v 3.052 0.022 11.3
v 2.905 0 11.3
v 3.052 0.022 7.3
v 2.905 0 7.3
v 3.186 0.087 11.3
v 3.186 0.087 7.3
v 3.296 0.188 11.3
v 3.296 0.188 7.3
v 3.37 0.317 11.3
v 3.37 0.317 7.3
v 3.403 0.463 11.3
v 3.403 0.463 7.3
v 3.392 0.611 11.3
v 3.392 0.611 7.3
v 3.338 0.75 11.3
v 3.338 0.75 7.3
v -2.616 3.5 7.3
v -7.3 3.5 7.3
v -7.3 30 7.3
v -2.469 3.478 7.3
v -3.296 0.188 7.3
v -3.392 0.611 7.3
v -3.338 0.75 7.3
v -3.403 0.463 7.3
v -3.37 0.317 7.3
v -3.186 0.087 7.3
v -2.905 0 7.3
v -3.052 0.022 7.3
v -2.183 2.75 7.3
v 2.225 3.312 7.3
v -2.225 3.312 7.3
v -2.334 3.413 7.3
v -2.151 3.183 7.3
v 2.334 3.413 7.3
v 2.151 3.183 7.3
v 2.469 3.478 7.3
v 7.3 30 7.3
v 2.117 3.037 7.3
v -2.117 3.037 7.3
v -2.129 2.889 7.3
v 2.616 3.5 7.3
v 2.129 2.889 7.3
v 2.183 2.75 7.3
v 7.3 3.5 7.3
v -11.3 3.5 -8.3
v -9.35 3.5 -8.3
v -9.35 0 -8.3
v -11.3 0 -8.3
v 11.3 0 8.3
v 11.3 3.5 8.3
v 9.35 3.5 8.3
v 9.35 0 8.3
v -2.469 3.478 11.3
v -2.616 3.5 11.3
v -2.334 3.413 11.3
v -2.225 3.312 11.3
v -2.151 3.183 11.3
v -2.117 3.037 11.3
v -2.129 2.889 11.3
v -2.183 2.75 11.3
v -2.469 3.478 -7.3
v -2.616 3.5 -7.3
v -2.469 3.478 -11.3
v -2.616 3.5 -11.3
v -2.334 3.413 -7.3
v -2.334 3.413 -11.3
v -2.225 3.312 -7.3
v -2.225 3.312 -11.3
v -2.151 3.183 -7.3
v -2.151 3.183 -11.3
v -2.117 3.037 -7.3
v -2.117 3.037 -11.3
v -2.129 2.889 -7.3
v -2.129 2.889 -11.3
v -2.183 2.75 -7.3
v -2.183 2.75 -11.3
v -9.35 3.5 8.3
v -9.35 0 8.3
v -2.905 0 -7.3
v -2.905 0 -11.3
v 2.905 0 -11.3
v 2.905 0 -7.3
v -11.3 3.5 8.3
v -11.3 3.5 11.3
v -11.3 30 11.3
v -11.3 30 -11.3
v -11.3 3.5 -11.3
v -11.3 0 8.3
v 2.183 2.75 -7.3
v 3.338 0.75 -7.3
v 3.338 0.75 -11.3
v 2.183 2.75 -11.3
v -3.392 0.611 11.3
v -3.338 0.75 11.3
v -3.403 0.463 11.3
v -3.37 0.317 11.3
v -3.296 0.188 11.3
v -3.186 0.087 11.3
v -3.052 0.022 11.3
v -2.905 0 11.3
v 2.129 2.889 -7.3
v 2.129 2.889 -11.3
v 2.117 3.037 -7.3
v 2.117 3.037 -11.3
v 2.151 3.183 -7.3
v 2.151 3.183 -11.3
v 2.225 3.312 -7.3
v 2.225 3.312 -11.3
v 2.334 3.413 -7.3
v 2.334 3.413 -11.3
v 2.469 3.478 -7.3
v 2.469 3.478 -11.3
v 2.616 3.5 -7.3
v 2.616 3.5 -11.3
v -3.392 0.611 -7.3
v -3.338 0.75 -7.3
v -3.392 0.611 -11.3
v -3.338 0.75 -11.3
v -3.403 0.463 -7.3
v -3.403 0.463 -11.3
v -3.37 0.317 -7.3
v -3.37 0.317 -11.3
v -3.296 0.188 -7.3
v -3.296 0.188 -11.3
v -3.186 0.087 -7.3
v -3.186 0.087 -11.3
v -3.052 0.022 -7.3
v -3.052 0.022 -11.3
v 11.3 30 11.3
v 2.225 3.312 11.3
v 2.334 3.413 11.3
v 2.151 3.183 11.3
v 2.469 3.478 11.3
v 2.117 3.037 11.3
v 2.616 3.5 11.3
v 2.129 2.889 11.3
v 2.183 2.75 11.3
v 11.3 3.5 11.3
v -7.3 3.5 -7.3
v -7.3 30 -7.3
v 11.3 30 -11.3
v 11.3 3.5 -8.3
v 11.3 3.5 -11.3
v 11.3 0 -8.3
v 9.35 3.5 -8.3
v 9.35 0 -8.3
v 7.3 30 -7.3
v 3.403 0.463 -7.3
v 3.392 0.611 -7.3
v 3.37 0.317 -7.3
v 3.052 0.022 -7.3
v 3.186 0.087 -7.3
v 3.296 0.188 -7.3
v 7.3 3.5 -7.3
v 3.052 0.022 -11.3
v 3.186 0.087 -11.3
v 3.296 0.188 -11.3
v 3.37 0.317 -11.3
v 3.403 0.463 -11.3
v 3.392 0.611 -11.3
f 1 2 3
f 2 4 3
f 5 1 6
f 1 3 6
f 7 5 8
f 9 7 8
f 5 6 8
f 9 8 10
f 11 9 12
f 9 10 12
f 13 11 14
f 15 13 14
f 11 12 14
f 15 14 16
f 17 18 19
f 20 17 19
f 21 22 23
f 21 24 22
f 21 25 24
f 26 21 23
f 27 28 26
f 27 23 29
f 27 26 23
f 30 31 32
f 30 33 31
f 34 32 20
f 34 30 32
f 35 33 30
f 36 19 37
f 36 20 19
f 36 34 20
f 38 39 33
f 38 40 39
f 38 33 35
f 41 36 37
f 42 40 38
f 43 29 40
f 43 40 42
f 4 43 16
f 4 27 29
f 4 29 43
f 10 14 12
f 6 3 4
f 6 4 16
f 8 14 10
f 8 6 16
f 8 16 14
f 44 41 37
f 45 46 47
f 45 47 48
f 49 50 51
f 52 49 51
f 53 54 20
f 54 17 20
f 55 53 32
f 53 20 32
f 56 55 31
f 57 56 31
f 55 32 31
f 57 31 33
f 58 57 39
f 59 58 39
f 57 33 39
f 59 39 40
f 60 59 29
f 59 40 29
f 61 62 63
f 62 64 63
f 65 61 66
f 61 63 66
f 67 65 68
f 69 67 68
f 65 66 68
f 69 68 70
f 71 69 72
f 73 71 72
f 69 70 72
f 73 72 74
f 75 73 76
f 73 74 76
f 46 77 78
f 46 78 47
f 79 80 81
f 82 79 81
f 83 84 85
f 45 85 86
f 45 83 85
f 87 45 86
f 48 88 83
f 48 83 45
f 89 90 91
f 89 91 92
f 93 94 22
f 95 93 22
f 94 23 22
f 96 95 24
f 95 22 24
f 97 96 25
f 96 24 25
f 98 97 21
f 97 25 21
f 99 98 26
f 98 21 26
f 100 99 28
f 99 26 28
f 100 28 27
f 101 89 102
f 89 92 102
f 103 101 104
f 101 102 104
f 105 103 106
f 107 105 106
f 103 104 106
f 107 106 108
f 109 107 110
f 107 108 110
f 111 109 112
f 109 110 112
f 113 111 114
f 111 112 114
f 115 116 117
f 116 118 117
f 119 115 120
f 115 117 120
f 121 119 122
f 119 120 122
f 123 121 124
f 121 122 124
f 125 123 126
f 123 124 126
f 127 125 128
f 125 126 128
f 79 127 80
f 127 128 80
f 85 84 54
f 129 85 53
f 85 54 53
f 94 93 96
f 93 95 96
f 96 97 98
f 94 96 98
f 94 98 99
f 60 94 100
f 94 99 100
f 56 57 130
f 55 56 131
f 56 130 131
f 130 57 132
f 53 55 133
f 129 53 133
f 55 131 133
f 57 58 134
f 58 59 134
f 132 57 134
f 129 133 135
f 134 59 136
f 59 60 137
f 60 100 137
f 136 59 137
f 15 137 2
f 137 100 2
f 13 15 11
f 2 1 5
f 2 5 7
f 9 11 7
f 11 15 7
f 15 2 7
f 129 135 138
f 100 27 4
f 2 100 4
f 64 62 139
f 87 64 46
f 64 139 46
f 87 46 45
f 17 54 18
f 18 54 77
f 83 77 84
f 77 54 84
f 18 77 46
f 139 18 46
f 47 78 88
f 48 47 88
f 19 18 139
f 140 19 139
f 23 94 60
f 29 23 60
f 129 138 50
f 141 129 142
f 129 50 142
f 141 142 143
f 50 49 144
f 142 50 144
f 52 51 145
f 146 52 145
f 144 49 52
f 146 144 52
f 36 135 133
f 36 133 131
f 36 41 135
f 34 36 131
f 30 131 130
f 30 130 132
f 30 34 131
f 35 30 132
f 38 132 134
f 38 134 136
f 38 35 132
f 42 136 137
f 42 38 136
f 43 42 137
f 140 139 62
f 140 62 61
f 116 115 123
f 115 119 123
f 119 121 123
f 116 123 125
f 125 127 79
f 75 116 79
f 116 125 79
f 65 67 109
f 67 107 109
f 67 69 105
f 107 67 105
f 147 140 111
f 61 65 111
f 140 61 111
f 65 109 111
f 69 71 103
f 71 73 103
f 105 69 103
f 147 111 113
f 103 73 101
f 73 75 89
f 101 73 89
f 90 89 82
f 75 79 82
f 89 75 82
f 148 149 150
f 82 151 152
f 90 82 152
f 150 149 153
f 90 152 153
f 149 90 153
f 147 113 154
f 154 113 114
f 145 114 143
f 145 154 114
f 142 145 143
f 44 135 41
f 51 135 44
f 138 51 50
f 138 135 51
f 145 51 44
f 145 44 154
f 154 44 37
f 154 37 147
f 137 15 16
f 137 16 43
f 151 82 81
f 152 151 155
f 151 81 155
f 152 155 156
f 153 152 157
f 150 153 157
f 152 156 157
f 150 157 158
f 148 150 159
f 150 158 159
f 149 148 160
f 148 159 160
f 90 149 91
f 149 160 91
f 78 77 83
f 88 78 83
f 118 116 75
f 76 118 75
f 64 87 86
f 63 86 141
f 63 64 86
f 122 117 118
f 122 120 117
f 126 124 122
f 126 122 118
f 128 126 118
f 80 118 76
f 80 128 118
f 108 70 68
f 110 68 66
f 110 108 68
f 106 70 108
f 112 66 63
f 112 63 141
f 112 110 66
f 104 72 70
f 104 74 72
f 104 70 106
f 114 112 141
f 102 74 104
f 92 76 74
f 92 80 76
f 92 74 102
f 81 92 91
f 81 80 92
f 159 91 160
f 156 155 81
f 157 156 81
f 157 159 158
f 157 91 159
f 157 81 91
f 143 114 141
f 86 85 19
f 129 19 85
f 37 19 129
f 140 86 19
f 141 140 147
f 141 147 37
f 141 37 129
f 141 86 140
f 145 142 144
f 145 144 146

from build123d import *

# Parameters (mm, degrees)
SKETCH1_W           = 22.6
SKETCH1_H           = 22.6
SKETCH1_W_2         = 14.6
SKETCH1_H_2         = 14.6
BOSS_EXTRUDE1_DEPTH = 30
CUT_EXTRUDE1_DEPTH  = 40.22307994
FILLET1_R           = 0.5
SKETCH3_W           = 1.95
SKETCH3_H           = 16.6
BOSS_EXTRUDE2_DEPTH = 3.5


with BuildPart() as part:
    # Sketch1 → Boss-Extrude1 (new body)
    with BuildSketch(Plane(origin=(0, 0, 0), x_dir=(1, 0, 0), z_dir=(0, 1, 0))):
        Rectangle(SKETCH1_W, SKETCH1_H)
        Rectangle(SKETCH1_W_2, SKETCH1_H_2, mode=Mode.SUBTRACT)
    extrude(amount=BOSS_EXTRUDE1_DEPTH)

    # Sketch2 → Cut-Extrude1 (cut, through all)
    with BuildSketch(Plane.XY.offset(11.3)):
        Polygon((3.770725942, 0), (1.75, 3.5), (11.3, 3.5), (11.3, 0), align=None)
        Polygon((-11.3, 3.5), (-11.3, 0), (-3.770725942, 0), (-1.75, 3.5), align=None)
    extrude(amount=-CUT_EXTRUDE1_DEPTH, mode=Mode.SUBTRACT)

    # Fillet1
    fillet1_edges = [part.edges().sort_by_distance(p)[0] for p in [
        (3.770725942, 0, -9.3),
        (3.770725942, 0, 9.3),
        (1.75, 3.5, 9.3),
        (1.75, 3.5, -9.3),
        (-1.75, 3.5, -9.3),
        (-1.75, 3.5, 9.3),
        (-3.770725942, 0, 9.3),
        (-3.770725942, 0, -9.3),
    ]]
    fillet(fillet1_edges, radius=FILLET1_R)

    # Sketch3 → Boss-Extrude2 (add)
    with BuildSketch(Plane(origin=(0, 3.5, 0), x_dir=(-1, 0, 0), z_dir=(0, -1, 0))):
        with Locations((-10.325, 0)):
            Rectangle(SKETCH3_W, SKETCH3_H)
        with Locations((10.325, 0)):
            Rectangle(SKETCH3_W, SKETCH3_H)
    extrude(amount=BOSS_EXTRUDE2_DEPTH)


solid = part.part
